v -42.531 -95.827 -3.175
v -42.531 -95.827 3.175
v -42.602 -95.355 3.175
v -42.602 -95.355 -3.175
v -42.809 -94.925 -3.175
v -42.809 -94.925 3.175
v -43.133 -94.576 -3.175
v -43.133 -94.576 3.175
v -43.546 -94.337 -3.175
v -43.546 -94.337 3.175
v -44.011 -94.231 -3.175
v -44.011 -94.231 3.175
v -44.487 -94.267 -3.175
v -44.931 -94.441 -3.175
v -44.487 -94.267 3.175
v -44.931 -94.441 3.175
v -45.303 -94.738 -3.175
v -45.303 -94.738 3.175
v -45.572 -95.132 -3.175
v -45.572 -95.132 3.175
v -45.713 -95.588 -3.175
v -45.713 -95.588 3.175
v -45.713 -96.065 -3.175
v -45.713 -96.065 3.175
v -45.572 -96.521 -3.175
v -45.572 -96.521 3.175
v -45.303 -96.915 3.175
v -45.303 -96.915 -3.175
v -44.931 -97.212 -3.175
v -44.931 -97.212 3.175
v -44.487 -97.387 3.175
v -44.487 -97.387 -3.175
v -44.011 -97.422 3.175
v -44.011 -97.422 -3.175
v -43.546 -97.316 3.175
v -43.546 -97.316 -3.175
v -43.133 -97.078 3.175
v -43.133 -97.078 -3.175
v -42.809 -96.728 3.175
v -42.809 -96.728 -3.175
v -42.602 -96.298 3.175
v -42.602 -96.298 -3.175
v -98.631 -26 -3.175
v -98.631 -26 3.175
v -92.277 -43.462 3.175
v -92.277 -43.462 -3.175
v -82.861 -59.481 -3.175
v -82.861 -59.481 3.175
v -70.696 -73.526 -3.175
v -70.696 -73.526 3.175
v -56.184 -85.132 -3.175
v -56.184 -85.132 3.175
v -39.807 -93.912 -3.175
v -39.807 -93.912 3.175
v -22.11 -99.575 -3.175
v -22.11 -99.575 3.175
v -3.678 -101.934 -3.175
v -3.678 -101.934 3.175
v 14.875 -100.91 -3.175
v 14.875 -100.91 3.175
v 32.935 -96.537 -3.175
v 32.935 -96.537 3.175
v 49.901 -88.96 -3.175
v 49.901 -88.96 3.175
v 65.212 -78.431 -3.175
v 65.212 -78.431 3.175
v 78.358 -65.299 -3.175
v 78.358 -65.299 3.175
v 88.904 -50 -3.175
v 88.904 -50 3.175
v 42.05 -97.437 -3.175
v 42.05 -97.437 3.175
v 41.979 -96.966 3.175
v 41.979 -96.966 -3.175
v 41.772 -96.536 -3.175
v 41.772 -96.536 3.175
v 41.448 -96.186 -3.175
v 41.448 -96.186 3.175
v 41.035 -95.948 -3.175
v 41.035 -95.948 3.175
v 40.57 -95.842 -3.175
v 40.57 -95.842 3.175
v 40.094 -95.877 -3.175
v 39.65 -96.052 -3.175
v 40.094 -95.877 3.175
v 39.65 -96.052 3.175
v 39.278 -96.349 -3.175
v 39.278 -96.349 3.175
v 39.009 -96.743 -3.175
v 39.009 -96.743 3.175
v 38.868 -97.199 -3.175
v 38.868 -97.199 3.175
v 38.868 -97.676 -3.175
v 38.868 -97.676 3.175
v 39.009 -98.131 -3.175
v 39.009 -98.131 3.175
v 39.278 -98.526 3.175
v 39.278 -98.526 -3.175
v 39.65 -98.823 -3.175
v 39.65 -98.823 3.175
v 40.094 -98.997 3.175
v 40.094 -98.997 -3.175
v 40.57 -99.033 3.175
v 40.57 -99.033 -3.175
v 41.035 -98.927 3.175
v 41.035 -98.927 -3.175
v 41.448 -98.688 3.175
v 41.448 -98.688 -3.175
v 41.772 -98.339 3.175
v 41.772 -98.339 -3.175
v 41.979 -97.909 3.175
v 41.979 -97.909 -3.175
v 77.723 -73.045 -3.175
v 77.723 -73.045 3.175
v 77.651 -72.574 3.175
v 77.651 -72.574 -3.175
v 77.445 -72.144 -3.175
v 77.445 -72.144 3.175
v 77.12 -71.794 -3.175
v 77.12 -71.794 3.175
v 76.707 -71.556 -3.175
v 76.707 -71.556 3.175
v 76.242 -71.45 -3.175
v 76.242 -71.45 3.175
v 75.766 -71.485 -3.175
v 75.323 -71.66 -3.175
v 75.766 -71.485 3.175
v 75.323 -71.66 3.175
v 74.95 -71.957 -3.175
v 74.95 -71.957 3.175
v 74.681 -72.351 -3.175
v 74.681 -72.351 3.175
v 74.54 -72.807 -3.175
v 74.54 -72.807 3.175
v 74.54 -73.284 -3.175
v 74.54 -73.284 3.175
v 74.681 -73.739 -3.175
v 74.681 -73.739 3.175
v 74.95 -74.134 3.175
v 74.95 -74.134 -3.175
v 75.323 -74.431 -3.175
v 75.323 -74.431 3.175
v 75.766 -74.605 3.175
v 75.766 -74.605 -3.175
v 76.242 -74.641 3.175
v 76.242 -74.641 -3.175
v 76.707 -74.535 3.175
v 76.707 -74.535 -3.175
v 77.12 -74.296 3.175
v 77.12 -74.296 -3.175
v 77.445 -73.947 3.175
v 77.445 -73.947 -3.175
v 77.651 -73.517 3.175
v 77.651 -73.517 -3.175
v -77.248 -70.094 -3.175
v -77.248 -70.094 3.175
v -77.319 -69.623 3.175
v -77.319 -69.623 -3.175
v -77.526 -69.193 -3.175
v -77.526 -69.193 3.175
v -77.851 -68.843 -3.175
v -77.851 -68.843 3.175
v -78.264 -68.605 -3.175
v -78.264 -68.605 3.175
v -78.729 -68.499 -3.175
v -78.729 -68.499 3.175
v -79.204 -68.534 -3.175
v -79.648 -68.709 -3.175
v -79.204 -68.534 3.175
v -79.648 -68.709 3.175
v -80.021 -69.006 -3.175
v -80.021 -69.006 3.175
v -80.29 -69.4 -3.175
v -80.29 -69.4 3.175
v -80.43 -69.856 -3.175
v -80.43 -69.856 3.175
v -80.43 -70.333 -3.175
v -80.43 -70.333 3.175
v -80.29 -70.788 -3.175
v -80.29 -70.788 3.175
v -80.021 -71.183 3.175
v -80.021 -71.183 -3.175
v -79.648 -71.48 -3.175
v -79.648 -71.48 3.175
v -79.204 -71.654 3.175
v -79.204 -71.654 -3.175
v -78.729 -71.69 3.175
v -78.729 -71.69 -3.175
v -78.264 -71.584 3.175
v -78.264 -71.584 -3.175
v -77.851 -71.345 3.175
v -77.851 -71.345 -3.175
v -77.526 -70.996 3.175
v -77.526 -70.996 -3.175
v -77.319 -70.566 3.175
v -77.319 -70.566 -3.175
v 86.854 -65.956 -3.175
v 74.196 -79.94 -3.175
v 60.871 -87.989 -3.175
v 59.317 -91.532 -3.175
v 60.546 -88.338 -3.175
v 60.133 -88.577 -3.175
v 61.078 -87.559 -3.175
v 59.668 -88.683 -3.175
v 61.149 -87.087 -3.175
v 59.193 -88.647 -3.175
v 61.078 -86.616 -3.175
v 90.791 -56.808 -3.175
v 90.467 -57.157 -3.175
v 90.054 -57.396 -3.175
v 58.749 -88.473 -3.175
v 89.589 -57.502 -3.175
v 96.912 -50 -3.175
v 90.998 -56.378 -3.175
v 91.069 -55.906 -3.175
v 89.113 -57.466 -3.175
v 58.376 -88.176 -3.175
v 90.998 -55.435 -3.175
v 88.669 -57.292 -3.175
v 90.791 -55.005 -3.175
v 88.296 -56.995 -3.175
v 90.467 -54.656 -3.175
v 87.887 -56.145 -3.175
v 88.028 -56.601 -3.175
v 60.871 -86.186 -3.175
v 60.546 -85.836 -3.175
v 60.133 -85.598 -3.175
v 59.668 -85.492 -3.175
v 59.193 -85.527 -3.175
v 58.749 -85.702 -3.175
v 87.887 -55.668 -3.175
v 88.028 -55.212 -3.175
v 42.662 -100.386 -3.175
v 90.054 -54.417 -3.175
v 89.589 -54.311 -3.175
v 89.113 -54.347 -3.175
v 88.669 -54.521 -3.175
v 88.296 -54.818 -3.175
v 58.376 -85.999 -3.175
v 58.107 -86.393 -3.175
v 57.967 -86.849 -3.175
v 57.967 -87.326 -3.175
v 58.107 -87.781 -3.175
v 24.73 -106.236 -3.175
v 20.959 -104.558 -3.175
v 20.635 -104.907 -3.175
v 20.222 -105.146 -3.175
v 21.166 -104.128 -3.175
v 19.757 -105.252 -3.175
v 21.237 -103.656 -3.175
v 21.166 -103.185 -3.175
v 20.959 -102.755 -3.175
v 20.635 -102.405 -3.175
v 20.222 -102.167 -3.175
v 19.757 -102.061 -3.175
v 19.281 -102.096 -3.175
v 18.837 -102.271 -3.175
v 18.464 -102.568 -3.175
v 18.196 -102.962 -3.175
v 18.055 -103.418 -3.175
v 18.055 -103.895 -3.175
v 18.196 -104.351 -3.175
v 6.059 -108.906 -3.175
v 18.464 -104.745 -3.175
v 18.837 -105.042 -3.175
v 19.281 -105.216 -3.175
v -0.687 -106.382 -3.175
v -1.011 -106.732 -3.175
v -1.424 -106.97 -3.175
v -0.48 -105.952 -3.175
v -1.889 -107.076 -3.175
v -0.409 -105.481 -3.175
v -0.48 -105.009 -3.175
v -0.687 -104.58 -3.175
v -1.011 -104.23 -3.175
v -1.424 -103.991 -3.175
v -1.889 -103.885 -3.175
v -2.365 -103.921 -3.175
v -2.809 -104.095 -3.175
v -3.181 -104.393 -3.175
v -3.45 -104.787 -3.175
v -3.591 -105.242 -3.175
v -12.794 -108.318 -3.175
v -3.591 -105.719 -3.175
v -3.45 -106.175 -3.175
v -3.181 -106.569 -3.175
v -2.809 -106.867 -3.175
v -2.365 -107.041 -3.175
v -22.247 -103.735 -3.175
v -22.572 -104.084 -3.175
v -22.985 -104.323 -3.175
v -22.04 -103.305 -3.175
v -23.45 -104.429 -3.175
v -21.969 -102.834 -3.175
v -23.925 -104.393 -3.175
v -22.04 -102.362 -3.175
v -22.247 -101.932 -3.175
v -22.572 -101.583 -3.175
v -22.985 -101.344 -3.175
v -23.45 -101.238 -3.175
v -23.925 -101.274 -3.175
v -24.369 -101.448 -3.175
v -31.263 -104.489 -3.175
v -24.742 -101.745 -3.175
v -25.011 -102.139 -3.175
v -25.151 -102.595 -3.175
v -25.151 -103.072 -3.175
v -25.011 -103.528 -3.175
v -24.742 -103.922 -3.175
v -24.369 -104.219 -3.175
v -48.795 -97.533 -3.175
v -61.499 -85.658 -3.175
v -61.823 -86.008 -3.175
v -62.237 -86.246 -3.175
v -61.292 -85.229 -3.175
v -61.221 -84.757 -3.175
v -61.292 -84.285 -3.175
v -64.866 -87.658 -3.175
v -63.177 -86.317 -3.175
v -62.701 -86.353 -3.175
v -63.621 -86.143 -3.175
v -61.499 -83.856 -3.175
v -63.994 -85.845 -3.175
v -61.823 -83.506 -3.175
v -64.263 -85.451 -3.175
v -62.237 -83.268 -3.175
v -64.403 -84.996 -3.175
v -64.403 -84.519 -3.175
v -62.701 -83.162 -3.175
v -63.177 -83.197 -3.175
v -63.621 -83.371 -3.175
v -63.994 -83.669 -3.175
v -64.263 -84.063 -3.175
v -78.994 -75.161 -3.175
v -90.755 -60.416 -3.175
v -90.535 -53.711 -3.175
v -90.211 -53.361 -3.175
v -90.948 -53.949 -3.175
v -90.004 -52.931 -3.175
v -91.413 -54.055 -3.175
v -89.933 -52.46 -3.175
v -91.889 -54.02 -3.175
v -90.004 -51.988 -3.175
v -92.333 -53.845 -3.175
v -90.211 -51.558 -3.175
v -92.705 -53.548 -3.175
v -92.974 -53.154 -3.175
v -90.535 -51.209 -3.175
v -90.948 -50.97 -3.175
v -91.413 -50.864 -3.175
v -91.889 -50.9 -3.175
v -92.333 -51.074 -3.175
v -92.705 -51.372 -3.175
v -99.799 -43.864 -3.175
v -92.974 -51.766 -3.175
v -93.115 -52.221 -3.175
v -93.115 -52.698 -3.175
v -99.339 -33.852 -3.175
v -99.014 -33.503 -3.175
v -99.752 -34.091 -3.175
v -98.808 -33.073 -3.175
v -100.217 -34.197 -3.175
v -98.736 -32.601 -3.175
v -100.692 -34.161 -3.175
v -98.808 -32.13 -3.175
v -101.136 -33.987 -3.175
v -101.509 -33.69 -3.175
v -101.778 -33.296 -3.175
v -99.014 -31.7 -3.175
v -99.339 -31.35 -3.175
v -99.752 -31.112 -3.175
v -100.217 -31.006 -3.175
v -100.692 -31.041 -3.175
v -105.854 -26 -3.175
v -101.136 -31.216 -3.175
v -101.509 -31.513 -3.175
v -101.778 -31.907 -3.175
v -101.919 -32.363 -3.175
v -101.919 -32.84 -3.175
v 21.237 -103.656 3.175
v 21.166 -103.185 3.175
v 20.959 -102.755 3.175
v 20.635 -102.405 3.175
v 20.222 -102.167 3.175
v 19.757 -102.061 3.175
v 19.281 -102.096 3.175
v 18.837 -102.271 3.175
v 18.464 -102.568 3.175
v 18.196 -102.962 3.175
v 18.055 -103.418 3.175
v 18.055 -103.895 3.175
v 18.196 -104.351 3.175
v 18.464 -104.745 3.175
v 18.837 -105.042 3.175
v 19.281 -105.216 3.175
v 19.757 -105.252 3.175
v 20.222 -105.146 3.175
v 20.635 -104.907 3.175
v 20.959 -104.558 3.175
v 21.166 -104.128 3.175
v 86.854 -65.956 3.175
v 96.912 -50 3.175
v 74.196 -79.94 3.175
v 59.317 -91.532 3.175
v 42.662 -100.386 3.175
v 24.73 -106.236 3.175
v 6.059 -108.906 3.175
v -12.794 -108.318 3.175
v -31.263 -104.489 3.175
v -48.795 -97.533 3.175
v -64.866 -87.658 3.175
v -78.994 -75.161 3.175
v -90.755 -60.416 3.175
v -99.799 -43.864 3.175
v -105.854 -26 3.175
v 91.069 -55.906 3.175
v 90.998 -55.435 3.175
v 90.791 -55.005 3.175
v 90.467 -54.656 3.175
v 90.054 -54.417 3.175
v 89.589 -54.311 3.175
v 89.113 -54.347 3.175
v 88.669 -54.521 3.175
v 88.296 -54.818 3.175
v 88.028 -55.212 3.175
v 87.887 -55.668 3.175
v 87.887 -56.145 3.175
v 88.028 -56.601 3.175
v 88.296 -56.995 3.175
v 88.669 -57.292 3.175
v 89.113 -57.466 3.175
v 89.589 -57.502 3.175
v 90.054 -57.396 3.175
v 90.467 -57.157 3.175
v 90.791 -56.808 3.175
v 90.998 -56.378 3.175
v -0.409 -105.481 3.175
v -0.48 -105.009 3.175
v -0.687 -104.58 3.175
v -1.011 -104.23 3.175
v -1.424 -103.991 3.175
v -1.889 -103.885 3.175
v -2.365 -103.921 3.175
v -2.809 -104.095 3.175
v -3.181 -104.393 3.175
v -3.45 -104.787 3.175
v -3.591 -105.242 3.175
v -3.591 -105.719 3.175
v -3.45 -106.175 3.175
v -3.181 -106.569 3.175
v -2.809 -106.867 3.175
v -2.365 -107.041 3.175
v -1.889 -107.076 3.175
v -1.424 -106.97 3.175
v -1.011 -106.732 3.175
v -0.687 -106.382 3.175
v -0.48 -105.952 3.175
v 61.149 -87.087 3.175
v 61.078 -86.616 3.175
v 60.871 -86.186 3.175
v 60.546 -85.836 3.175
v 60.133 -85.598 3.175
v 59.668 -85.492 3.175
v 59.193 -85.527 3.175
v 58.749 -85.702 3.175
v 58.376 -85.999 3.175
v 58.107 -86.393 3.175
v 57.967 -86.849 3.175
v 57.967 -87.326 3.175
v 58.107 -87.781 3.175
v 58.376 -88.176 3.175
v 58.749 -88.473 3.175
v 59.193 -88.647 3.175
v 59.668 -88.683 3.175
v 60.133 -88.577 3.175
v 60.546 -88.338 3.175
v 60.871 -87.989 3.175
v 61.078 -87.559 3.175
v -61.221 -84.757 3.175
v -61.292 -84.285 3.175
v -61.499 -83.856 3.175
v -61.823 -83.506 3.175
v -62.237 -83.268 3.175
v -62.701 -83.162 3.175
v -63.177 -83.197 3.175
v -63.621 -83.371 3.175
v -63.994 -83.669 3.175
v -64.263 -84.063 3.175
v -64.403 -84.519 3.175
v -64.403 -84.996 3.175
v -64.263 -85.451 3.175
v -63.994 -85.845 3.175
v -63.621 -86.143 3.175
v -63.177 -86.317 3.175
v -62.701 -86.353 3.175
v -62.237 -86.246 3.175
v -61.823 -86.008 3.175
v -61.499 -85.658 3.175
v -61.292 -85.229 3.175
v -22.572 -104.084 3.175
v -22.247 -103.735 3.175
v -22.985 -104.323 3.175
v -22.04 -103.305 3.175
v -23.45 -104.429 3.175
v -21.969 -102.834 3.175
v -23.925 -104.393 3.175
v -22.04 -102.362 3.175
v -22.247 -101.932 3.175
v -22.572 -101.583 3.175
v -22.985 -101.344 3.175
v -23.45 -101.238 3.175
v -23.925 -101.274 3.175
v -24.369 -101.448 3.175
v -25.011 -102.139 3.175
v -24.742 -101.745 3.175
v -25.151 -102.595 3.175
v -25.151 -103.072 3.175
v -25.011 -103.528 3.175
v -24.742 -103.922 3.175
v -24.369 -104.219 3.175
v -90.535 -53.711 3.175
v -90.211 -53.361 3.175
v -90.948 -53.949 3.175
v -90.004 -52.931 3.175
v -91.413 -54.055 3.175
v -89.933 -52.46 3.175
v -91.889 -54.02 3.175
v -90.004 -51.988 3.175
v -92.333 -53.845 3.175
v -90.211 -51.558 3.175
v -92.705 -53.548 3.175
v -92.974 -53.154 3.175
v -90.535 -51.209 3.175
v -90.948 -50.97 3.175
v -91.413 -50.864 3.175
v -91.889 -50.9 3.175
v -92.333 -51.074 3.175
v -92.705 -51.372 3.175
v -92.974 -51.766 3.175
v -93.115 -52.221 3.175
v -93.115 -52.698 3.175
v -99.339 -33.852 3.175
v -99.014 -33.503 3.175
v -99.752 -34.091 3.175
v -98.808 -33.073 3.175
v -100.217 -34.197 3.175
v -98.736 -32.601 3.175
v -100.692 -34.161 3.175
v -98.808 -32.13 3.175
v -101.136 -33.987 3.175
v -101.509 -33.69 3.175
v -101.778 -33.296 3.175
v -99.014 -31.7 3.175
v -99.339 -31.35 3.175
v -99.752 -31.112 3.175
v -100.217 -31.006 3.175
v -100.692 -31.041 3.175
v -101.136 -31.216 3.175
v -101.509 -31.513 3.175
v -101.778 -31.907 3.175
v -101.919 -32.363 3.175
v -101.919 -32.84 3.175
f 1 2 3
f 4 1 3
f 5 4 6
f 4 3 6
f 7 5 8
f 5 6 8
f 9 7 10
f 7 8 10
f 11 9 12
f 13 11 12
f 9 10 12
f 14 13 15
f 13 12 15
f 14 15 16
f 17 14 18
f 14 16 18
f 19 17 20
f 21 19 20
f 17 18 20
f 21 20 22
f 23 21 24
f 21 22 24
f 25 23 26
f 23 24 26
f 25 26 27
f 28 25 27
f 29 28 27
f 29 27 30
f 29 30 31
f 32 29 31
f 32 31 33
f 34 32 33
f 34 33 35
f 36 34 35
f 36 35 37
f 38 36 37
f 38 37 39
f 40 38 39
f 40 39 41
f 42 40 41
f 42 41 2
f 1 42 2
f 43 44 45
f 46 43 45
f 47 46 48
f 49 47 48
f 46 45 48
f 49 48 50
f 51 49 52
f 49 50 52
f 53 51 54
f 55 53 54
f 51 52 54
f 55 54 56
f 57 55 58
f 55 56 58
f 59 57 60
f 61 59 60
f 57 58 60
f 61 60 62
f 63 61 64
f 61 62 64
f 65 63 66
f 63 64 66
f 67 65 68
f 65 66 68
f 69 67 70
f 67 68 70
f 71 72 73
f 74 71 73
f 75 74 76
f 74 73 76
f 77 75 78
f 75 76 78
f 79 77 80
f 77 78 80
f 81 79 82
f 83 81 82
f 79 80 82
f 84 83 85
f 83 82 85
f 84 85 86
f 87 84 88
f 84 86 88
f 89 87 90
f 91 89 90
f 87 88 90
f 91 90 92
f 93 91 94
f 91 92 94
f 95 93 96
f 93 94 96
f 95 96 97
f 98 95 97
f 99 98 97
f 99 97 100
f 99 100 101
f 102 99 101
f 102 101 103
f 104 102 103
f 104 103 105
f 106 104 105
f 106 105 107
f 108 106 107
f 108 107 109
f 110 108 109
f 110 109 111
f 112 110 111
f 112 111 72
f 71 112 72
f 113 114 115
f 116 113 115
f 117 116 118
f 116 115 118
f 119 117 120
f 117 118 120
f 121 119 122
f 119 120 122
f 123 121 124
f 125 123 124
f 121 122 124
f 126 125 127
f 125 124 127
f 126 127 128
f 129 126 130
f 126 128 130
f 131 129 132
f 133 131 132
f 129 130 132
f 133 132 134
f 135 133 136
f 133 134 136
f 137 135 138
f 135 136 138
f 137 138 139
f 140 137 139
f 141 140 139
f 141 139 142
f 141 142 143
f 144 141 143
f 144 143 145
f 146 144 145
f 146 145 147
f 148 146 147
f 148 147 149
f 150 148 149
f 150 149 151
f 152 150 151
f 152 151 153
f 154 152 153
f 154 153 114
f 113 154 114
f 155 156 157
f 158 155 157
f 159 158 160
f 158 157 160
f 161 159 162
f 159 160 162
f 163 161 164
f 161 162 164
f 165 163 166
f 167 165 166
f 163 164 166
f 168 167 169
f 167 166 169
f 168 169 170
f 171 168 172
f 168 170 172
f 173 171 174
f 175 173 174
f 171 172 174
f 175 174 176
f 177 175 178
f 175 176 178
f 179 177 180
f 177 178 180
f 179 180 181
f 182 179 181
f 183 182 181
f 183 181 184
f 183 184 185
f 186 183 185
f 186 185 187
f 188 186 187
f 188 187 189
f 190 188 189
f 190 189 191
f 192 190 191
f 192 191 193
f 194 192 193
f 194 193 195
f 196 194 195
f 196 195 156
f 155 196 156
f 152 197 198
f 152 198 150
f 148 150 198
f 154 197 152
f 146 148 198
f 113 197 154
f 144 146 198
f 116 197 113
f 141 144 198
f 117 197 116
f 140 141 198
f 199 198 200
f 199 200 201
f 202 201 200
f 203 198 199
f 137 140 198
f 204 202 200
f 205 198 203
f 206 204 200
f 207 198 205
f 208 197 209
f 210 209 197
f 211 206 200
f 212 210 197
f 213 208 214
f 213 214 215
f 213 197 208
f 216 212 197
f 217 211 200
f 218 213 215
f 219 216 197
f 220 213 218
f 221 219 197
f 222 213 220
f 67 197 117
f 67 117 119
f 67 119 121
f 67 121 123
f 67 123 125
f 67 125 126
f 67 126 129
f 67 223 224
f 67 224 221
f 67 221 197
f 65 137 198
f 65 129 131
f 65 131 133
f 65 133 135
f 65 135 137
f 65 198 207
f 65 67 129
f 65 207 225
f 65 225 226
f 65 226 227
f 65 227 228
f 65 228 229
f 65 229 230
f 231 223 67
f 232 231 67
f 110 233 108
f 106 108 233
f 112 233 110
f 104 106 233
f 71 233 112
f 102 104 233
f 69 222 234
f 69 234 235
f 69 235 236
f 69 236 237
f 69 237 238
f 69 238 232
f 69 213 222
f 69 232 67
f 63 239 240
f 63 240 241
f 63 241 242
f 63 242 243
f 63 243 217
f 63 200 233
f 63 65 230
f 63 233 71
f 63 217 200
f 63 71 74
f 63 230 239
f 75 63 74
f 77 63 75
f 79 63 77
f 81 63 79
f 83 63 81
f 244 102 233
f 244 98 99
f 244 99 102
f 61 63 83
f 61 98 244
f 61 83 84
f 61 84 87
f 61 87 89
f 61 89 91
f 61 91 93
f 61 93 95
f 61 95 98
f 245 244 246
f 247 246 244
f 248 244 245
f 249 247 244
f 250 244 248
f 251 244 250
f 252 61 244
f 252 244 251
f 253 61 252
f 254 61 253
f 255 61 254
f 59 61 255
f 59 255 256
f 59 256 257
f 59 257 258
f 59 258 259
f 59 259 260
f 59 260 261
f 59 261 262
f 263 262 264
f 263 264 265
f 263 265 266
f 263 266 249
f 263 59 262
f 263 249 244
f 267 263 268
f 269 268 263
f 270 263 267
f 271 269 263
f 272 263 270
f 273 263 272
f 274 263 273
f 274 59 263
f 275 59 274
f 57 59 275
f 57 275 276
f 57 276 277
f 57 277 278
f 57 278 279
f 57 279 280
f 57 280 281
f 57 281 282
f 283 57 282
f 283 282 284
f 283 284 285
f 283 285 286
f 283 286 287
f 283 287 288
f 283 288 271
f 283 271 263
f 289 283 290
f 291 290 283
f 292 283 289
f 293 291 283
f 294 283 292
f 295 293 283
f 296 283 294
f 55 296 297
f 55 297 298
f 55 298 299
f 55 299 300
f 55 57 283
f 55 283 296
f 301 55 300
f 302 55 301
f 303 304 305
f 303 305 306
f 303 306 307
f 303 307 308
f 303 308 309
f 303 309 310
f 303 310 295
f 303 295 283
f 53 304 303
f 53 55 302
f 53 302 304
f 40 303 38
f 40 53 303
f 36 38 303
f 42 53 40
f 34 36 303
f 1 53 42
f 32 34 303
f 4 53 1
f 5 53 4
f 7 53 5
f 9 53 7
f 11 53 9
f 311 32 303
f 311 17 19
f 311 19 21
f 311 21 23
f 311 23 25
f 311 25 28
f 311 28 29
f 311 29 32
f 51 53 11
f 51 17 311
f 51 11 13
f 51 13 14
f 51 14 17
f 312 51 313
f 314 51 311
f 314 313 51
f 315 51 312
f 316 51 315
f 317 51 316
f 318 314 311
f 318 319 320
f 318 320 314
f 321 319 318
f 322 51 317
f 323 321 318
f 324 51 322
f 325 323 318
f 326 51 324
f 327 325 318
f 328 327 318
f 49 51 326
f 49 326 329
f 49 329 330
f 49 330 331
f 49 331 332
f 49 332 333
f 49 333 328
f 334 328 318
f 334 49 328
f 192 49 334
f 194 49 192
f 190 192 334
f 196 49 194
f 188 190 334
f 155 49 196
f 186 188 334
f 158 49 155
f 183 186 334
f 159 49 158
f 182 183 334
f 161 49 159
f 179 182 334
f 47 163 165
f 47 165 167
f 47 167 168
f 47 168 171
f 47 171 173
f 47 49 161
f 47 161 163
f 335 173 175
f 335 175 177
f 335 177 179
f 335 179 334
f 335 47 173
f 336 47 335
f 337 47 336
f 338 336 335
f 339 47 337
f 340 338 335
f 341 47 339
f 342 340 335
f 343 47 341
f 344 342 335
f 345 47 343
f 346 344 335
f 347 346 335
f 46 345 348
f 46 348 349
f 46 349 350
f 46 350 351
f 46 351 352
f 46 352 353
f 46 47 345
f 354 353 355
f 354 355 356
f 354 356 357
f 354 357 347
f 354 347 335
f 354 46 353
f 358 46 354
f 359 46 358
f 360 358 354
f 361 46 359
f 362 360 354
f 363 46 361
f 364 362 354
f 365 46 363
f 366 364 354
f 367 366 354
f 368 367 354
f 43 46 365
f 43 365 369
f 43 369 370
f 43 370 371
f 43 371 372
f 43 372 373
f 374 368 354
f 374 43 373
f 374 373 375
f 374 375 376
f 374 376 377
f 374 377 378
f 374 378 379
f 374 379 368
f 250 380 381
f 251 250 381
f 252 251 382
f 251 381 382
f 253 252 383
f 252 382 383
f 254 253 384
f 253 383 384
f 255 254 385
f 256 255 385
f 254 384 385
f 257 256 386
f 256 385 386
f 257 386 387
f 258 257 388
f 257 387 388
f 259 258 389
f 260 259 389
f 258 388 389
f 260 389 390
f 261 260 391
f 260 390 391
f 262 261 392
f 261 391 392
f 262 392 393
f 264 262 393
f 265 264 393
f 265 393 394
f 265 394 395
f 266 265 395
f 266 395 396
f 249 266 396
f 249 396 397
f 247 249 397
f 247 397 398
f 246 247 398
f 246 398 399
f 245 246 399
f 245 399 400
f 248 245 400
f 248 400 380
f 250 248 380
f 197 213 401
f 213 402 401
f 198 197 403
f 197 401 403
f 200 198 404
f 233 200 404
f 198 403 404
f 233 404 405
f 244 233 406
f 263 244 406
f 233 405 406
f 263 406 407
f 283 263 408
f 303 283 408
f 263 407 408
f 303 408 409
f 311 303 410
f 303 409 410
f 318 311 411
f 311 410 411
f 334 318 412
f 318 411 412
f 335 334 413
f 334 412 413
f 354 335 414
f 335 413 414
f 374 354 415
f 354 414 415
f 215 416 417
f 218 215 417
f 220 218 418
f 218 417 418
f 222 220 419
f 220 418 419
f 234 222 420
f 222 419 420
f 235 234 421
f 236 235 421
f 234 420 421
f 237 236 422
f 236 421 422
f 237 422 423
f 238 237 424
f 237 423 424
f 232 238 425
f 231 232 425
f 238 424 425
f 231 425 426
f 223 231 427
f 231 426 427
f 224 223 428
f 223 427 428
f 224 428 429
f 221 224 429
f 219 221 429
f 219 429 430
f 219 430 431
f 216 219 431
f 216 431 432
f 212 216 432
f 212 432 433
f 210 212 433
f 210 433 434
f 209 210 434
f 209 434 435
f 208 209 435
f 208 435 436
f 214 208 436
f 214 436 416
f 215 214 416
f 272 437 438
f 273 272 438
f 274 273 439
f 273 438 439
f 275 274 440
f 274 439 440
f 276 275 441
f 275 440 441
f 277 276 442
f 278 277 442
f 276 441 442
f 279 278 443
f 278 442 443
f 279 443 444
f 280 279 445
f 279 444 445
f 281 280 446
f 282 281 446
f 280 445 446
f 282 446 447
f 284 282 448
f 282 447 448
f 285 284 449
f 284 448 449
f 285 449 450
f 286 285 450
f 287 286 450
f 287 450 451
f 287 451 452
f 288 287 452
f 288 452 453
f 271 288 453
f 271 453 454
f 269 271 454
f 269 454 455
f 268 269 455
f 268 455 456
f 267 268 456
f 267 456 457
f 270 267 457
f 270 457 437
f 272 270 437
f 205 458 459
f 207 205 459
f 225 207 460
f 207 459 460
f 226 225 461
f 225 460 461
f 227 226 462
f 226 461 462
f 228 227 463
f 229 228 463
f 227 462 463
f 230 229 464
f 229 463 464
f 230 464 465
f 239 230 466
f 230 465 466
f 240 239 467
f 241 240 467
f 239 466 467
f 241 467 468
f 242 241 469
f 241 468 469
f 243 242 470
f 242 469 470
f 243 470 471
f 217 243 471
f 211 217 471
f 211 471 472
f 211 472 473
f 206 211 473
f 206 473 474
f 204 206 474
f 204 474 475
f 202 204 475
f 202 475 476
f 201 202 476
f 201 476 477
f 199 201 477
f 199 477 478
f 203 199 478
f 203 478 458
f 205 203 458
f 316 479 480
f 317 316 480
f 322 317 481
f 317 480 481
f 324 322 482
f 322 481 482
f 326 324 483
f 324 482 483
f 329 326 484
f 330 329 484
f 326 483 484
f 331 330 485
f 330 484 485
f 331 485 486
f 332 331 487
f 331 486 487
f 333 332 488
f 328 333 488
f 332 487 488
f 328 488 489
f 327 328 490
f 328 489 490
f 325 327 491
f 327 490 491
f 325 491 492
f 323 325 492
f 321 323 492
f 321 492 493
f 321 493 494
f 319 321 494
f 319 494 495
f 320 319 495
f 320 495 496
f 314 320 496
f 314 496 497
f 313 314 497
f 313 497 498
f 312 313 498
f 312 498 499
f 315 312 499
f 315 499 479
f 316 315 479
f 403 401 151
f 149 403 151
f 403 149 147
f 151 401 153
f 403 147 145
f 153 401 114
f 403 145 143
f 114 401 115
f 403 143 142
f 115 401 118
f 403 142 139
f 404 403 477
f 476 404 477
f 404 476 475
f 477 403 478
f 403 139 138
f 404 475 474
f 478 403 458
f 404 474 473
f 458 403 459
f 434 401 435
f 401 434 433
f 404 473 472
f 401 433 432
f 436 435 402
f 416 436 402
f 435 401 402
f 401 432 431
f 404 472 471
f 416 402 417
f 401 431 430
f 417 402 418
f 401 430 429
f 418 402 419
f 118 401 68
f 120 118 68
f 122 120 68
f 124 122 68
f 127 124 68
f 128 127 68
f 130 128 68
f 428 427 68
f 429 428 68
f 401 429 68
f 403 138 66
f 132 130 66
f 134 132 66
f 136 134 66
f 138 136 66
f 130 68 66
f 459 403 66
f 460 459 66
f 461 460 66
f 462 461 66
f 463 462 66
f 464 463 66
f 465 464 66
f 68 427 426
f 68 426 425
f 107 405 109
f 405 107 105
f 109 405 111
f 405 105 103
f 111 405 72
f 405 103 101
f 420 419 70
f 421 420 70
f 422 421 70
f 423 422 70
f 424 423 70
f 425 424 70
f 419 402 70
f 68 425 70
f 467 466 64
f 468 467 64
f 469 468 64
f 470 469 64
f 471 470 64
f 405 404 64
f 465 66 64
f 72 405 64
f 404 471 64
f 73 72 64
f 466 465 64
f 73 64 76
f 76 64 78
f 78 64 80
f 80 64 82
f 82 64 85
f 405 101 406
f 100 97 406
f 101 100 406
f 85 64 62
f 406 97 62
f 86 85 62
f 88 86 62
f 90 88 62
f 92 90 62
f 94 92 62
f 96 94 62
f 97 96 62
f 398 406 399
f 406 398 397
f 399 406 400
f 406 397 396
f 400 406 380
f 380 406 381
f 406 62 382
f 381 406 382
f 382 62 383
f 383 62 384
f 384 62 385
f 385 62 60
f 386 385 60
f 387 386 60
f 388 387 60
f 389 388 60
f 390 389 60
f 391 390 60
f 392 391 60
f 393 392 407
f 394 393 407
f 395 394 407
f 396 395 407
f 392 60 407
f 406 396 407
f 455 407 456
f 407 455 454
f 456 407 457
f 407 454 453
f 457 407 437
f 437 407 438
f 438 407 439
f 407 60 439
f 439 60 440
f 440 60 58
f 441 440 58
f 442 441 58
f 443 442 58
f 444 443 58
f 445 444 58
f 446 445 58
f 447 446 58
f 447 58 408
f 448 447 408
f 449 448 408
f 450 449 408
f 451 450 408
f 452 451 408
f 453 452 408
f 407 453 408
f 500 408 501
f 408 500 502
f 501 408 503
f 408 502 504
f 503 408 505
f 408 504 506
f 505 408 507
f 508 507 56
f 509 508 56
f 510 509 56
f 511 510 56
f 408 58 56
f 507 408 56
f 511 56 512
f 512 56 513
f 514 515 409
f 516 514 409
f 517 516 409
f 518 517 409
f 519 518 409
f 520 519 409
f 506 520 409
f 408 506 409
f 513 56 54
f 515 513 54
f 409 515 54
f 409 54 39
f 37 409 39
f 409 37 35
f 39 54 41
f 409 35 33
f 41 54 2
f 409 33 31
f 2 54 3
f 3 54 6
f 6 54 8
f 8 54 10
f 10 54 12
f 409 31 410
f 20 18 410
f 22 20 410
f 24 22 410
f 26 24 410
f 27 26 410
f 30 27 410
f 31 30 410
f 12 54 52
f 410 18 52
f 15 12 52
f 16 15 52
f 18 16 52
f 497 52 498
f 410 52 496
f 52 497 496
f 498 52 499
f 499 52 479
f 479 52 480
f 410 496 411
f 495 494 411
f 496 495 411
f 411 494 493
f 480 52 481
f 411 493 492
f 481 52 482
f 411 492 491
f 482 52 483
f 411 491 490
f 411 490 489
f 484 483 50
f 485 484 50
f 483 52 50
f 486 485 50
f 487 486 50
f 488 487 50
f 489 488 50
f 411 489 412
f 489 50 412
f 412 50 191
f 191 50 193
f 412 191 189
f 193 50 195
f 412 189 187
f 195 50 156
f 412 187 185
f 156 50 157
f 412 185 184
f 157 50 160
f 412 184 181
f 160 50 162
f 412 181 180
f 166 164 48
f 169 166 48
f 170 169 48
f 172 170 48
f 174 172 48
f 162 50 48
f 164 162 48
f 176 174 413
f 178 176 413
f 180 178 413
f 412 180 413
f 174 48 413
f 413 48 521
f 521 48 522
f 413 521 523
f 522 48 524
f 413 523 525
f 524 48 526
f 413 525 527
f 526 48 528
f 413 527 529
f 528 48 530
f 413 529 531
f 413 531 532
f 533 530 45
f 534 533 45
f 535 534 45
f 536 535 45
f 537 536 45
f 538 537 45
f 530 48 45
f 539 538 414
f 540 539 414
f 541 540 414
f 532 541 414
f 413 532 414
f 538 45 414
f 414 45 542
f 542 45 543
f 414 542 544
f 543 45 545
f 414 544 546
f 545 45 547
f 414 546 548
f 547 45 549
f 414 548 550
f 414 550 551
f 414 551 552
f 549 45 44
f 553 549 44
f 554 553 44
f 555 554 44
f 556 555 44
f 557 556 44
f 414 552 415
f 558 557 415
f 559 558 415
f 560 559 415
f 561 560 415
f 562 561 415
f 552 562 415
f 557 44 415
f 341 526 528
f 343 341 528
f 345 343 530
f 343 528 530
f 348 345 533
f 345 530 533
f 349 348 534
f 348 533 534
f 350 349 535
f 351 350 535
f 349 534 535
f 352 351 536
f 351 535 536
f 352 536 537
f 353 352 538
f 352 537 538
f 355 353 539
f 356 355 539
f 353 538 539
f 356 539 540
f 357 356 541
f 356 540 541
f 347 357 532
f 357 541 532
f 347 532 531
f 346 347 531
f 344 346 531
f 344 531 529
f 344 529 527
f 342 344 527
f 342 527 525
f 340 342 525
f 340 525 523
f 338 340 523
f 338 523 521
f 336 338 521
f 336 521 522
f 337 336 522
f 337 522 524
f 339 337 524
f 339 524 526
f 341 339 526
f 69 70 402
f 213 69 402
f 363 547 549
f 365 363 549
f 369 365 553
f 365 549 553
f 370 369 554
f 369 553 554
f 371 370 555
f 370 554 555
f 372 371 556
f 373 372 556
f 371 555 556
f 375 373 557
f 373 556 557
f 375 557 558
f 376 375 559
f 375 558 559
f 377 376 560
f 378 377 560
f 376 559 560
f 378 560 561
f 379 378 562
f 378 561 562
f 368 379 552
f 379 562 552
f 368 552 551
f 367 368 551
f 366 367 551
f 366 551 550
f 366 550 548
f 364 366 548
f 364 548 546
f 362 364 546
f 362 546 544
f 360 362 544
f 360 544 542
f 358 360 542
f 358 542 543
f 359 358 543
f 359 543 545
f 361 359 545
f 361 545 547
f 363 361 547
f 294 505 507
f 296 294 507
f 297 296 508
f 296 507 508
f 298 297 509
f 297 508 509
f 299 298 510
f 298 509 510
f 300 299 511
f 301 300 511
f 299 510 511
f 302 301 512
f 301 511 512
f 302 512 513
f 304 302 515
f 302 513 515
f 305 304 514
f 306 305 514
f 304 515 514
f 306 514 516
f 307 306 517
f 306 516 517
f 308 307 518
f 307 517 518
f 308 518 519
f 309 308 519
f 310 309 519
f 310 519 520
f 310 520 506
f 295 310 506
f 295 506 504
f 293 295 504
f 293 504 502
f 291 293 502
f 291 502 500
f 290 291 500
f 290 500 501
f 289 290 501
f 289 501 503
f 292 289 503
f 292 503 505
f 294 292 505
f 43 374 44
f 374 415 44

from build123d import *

# Parameters (mm, degrees)
BOSS_EXTRUDE1_DEPTH = 3.175
SKETCH4_R           = 1.6
CUT_EXTRUDE3_DEPTH  = 153.126359575


with BuildPart() as part:
    # Sketch1 → Boss-Extrude1 (new, symmetric)
    with BuildSketch(Plane.XY):
        with BuildLine():
            Line((88.904443084, -50), (96.911769633, -50))
            ThreePointArc((96.911769633, -50), (-12.794056242, -108.31825077), (-105.853672586, -26))
            Line((-105.853672586, -26), (-98.630624048, -26))
            ThreePointArc((-98.630624048, -26), (-12.947959261, -101.174850388), (88.904443084, -50))
        make_face()
    extrude(amount=BOSS_EXTRUDE1_DEPTH, both=True)

    # Sketch4 → Cut-Extrude3 (cut, through all)
    with BuildSketch(Plane.XY.offset(3.175)):
        with Locations((-103.194571877, -21.934683381)):
            Circle(SKETCH4_R)
        with Locations((-105.407458575, -4.417881468)):
            Circle(SKETCH4_R)
        with Locations((-104.668100989, -13.222656141)):
            Circle(SKETCH4_R)
        with Locations((-100.336462469, 32.601292907)):
            Circle(SKETCH4_R)
        with Locations((104.295371407, 15.897342642)):
            Circle(SKETCH4_R)
        with Locations((100.708995202, 31.43164465)):
            Circle(SKETCH4_R)
        with Locations((94.822771885, 46.248155986)):
            Circle(SKETCH4_R)
        with Locations((-103.194571877, 21.934683381)):
            Circle(SKETCH4_R)
        with Locations((-104.668100989, 13.222656141)):
            Circle(SKETCH4_R)
        with Locations((-105.407458575, 4.417881468)):
            Circle(SKETCH4_R)
        with Locations((89.469074145, -55.906482377)):
            Circle(SKETCH4_R)
        with Locations((-44.130594647, 95.826617472)):
            Circle(SKETCH4_R)
        with Locations((-62.82106423, 84.757087545)):
            Circle(SKETCH4_R)
        with Locations((-78.848228037, 70.094271773)):
            Circle(SKETCH4_R)
        with Locations((-91.532612735, 52.45980181)):
            Circle(SKETCH4_R)
        with Locations((94.822771885, -46.248155986)):
            Circle(SKETCH4_R)
        with Locations((100.708995202, -31.43164465)):
            Circle(SKETCH4_R)
        with Locations((104.295371407, -15.897342642)):
            Circle(SKETCH4_R)
        with Locations((105.5, 0)):
            Circle(SKETCH4_R)
        with Locations((76.122528254, -73.04526468)):
            Circle(SKETCH4_R)
        with Locations((89.469074145, 55.906482377)):
            Circle(SKETCH4_R)
        with Locations((76.122528254, 73.04526468)):
            Circle(SKETCH4_R)
        with Locations((59.54875959, 87.08728513)):
            Circle(SKETCH4_R)
        with Locations((40.450414858, 97.437230758)):
            Circle(SKETCH4_R)
        with Locations((19.637170436, 103.656314507)):
            Circle(SKETCH4_R)
        with Locations((-2.008593938, 105.480877653)):
            Circle(SKETCH4_R)
        with Locations((-23.569203757, 102.833567643)):
            Circle(SKETCH4_R)
        with Locations((-91.532612735, -52.45980181)):
            Circle(SKETCH4_R)
        with Locations((-62.82106423, -84.757087545)):
            Circle(SKETCH4_R)
        with Locations((-44.130594647, -95.826617472)):
            Circle(SKETCH4_R)
        with Locations((-23.569203757, -102.833567643)):
            Circle(SKETCH4_R)
        with Locations((-2.008593938, -105.480877653)):
            Circle(SKETCH4_R)
        with Locations((19.637170436, -103.656314507)):
            Circle(SKETCH4_R)
        with Locations((40.450414858, -97.437230758)):
            Circle(SKETCH4_R)
        with Locations((59.54875959, -87.08728513)):
            Circle(SKETCH4_R)
        with Locations((-78.848228037, -70.094271773)):
            Circle(SKETCH4_R)
        with Locations((-100.336462469, -32.601292907)):
            Circle(SKETCH4_R)
    extrude(amount=-CUT_EXTRUDE3_DEPTH, mode=Mode.SUBTRACT)


solid = part.part
